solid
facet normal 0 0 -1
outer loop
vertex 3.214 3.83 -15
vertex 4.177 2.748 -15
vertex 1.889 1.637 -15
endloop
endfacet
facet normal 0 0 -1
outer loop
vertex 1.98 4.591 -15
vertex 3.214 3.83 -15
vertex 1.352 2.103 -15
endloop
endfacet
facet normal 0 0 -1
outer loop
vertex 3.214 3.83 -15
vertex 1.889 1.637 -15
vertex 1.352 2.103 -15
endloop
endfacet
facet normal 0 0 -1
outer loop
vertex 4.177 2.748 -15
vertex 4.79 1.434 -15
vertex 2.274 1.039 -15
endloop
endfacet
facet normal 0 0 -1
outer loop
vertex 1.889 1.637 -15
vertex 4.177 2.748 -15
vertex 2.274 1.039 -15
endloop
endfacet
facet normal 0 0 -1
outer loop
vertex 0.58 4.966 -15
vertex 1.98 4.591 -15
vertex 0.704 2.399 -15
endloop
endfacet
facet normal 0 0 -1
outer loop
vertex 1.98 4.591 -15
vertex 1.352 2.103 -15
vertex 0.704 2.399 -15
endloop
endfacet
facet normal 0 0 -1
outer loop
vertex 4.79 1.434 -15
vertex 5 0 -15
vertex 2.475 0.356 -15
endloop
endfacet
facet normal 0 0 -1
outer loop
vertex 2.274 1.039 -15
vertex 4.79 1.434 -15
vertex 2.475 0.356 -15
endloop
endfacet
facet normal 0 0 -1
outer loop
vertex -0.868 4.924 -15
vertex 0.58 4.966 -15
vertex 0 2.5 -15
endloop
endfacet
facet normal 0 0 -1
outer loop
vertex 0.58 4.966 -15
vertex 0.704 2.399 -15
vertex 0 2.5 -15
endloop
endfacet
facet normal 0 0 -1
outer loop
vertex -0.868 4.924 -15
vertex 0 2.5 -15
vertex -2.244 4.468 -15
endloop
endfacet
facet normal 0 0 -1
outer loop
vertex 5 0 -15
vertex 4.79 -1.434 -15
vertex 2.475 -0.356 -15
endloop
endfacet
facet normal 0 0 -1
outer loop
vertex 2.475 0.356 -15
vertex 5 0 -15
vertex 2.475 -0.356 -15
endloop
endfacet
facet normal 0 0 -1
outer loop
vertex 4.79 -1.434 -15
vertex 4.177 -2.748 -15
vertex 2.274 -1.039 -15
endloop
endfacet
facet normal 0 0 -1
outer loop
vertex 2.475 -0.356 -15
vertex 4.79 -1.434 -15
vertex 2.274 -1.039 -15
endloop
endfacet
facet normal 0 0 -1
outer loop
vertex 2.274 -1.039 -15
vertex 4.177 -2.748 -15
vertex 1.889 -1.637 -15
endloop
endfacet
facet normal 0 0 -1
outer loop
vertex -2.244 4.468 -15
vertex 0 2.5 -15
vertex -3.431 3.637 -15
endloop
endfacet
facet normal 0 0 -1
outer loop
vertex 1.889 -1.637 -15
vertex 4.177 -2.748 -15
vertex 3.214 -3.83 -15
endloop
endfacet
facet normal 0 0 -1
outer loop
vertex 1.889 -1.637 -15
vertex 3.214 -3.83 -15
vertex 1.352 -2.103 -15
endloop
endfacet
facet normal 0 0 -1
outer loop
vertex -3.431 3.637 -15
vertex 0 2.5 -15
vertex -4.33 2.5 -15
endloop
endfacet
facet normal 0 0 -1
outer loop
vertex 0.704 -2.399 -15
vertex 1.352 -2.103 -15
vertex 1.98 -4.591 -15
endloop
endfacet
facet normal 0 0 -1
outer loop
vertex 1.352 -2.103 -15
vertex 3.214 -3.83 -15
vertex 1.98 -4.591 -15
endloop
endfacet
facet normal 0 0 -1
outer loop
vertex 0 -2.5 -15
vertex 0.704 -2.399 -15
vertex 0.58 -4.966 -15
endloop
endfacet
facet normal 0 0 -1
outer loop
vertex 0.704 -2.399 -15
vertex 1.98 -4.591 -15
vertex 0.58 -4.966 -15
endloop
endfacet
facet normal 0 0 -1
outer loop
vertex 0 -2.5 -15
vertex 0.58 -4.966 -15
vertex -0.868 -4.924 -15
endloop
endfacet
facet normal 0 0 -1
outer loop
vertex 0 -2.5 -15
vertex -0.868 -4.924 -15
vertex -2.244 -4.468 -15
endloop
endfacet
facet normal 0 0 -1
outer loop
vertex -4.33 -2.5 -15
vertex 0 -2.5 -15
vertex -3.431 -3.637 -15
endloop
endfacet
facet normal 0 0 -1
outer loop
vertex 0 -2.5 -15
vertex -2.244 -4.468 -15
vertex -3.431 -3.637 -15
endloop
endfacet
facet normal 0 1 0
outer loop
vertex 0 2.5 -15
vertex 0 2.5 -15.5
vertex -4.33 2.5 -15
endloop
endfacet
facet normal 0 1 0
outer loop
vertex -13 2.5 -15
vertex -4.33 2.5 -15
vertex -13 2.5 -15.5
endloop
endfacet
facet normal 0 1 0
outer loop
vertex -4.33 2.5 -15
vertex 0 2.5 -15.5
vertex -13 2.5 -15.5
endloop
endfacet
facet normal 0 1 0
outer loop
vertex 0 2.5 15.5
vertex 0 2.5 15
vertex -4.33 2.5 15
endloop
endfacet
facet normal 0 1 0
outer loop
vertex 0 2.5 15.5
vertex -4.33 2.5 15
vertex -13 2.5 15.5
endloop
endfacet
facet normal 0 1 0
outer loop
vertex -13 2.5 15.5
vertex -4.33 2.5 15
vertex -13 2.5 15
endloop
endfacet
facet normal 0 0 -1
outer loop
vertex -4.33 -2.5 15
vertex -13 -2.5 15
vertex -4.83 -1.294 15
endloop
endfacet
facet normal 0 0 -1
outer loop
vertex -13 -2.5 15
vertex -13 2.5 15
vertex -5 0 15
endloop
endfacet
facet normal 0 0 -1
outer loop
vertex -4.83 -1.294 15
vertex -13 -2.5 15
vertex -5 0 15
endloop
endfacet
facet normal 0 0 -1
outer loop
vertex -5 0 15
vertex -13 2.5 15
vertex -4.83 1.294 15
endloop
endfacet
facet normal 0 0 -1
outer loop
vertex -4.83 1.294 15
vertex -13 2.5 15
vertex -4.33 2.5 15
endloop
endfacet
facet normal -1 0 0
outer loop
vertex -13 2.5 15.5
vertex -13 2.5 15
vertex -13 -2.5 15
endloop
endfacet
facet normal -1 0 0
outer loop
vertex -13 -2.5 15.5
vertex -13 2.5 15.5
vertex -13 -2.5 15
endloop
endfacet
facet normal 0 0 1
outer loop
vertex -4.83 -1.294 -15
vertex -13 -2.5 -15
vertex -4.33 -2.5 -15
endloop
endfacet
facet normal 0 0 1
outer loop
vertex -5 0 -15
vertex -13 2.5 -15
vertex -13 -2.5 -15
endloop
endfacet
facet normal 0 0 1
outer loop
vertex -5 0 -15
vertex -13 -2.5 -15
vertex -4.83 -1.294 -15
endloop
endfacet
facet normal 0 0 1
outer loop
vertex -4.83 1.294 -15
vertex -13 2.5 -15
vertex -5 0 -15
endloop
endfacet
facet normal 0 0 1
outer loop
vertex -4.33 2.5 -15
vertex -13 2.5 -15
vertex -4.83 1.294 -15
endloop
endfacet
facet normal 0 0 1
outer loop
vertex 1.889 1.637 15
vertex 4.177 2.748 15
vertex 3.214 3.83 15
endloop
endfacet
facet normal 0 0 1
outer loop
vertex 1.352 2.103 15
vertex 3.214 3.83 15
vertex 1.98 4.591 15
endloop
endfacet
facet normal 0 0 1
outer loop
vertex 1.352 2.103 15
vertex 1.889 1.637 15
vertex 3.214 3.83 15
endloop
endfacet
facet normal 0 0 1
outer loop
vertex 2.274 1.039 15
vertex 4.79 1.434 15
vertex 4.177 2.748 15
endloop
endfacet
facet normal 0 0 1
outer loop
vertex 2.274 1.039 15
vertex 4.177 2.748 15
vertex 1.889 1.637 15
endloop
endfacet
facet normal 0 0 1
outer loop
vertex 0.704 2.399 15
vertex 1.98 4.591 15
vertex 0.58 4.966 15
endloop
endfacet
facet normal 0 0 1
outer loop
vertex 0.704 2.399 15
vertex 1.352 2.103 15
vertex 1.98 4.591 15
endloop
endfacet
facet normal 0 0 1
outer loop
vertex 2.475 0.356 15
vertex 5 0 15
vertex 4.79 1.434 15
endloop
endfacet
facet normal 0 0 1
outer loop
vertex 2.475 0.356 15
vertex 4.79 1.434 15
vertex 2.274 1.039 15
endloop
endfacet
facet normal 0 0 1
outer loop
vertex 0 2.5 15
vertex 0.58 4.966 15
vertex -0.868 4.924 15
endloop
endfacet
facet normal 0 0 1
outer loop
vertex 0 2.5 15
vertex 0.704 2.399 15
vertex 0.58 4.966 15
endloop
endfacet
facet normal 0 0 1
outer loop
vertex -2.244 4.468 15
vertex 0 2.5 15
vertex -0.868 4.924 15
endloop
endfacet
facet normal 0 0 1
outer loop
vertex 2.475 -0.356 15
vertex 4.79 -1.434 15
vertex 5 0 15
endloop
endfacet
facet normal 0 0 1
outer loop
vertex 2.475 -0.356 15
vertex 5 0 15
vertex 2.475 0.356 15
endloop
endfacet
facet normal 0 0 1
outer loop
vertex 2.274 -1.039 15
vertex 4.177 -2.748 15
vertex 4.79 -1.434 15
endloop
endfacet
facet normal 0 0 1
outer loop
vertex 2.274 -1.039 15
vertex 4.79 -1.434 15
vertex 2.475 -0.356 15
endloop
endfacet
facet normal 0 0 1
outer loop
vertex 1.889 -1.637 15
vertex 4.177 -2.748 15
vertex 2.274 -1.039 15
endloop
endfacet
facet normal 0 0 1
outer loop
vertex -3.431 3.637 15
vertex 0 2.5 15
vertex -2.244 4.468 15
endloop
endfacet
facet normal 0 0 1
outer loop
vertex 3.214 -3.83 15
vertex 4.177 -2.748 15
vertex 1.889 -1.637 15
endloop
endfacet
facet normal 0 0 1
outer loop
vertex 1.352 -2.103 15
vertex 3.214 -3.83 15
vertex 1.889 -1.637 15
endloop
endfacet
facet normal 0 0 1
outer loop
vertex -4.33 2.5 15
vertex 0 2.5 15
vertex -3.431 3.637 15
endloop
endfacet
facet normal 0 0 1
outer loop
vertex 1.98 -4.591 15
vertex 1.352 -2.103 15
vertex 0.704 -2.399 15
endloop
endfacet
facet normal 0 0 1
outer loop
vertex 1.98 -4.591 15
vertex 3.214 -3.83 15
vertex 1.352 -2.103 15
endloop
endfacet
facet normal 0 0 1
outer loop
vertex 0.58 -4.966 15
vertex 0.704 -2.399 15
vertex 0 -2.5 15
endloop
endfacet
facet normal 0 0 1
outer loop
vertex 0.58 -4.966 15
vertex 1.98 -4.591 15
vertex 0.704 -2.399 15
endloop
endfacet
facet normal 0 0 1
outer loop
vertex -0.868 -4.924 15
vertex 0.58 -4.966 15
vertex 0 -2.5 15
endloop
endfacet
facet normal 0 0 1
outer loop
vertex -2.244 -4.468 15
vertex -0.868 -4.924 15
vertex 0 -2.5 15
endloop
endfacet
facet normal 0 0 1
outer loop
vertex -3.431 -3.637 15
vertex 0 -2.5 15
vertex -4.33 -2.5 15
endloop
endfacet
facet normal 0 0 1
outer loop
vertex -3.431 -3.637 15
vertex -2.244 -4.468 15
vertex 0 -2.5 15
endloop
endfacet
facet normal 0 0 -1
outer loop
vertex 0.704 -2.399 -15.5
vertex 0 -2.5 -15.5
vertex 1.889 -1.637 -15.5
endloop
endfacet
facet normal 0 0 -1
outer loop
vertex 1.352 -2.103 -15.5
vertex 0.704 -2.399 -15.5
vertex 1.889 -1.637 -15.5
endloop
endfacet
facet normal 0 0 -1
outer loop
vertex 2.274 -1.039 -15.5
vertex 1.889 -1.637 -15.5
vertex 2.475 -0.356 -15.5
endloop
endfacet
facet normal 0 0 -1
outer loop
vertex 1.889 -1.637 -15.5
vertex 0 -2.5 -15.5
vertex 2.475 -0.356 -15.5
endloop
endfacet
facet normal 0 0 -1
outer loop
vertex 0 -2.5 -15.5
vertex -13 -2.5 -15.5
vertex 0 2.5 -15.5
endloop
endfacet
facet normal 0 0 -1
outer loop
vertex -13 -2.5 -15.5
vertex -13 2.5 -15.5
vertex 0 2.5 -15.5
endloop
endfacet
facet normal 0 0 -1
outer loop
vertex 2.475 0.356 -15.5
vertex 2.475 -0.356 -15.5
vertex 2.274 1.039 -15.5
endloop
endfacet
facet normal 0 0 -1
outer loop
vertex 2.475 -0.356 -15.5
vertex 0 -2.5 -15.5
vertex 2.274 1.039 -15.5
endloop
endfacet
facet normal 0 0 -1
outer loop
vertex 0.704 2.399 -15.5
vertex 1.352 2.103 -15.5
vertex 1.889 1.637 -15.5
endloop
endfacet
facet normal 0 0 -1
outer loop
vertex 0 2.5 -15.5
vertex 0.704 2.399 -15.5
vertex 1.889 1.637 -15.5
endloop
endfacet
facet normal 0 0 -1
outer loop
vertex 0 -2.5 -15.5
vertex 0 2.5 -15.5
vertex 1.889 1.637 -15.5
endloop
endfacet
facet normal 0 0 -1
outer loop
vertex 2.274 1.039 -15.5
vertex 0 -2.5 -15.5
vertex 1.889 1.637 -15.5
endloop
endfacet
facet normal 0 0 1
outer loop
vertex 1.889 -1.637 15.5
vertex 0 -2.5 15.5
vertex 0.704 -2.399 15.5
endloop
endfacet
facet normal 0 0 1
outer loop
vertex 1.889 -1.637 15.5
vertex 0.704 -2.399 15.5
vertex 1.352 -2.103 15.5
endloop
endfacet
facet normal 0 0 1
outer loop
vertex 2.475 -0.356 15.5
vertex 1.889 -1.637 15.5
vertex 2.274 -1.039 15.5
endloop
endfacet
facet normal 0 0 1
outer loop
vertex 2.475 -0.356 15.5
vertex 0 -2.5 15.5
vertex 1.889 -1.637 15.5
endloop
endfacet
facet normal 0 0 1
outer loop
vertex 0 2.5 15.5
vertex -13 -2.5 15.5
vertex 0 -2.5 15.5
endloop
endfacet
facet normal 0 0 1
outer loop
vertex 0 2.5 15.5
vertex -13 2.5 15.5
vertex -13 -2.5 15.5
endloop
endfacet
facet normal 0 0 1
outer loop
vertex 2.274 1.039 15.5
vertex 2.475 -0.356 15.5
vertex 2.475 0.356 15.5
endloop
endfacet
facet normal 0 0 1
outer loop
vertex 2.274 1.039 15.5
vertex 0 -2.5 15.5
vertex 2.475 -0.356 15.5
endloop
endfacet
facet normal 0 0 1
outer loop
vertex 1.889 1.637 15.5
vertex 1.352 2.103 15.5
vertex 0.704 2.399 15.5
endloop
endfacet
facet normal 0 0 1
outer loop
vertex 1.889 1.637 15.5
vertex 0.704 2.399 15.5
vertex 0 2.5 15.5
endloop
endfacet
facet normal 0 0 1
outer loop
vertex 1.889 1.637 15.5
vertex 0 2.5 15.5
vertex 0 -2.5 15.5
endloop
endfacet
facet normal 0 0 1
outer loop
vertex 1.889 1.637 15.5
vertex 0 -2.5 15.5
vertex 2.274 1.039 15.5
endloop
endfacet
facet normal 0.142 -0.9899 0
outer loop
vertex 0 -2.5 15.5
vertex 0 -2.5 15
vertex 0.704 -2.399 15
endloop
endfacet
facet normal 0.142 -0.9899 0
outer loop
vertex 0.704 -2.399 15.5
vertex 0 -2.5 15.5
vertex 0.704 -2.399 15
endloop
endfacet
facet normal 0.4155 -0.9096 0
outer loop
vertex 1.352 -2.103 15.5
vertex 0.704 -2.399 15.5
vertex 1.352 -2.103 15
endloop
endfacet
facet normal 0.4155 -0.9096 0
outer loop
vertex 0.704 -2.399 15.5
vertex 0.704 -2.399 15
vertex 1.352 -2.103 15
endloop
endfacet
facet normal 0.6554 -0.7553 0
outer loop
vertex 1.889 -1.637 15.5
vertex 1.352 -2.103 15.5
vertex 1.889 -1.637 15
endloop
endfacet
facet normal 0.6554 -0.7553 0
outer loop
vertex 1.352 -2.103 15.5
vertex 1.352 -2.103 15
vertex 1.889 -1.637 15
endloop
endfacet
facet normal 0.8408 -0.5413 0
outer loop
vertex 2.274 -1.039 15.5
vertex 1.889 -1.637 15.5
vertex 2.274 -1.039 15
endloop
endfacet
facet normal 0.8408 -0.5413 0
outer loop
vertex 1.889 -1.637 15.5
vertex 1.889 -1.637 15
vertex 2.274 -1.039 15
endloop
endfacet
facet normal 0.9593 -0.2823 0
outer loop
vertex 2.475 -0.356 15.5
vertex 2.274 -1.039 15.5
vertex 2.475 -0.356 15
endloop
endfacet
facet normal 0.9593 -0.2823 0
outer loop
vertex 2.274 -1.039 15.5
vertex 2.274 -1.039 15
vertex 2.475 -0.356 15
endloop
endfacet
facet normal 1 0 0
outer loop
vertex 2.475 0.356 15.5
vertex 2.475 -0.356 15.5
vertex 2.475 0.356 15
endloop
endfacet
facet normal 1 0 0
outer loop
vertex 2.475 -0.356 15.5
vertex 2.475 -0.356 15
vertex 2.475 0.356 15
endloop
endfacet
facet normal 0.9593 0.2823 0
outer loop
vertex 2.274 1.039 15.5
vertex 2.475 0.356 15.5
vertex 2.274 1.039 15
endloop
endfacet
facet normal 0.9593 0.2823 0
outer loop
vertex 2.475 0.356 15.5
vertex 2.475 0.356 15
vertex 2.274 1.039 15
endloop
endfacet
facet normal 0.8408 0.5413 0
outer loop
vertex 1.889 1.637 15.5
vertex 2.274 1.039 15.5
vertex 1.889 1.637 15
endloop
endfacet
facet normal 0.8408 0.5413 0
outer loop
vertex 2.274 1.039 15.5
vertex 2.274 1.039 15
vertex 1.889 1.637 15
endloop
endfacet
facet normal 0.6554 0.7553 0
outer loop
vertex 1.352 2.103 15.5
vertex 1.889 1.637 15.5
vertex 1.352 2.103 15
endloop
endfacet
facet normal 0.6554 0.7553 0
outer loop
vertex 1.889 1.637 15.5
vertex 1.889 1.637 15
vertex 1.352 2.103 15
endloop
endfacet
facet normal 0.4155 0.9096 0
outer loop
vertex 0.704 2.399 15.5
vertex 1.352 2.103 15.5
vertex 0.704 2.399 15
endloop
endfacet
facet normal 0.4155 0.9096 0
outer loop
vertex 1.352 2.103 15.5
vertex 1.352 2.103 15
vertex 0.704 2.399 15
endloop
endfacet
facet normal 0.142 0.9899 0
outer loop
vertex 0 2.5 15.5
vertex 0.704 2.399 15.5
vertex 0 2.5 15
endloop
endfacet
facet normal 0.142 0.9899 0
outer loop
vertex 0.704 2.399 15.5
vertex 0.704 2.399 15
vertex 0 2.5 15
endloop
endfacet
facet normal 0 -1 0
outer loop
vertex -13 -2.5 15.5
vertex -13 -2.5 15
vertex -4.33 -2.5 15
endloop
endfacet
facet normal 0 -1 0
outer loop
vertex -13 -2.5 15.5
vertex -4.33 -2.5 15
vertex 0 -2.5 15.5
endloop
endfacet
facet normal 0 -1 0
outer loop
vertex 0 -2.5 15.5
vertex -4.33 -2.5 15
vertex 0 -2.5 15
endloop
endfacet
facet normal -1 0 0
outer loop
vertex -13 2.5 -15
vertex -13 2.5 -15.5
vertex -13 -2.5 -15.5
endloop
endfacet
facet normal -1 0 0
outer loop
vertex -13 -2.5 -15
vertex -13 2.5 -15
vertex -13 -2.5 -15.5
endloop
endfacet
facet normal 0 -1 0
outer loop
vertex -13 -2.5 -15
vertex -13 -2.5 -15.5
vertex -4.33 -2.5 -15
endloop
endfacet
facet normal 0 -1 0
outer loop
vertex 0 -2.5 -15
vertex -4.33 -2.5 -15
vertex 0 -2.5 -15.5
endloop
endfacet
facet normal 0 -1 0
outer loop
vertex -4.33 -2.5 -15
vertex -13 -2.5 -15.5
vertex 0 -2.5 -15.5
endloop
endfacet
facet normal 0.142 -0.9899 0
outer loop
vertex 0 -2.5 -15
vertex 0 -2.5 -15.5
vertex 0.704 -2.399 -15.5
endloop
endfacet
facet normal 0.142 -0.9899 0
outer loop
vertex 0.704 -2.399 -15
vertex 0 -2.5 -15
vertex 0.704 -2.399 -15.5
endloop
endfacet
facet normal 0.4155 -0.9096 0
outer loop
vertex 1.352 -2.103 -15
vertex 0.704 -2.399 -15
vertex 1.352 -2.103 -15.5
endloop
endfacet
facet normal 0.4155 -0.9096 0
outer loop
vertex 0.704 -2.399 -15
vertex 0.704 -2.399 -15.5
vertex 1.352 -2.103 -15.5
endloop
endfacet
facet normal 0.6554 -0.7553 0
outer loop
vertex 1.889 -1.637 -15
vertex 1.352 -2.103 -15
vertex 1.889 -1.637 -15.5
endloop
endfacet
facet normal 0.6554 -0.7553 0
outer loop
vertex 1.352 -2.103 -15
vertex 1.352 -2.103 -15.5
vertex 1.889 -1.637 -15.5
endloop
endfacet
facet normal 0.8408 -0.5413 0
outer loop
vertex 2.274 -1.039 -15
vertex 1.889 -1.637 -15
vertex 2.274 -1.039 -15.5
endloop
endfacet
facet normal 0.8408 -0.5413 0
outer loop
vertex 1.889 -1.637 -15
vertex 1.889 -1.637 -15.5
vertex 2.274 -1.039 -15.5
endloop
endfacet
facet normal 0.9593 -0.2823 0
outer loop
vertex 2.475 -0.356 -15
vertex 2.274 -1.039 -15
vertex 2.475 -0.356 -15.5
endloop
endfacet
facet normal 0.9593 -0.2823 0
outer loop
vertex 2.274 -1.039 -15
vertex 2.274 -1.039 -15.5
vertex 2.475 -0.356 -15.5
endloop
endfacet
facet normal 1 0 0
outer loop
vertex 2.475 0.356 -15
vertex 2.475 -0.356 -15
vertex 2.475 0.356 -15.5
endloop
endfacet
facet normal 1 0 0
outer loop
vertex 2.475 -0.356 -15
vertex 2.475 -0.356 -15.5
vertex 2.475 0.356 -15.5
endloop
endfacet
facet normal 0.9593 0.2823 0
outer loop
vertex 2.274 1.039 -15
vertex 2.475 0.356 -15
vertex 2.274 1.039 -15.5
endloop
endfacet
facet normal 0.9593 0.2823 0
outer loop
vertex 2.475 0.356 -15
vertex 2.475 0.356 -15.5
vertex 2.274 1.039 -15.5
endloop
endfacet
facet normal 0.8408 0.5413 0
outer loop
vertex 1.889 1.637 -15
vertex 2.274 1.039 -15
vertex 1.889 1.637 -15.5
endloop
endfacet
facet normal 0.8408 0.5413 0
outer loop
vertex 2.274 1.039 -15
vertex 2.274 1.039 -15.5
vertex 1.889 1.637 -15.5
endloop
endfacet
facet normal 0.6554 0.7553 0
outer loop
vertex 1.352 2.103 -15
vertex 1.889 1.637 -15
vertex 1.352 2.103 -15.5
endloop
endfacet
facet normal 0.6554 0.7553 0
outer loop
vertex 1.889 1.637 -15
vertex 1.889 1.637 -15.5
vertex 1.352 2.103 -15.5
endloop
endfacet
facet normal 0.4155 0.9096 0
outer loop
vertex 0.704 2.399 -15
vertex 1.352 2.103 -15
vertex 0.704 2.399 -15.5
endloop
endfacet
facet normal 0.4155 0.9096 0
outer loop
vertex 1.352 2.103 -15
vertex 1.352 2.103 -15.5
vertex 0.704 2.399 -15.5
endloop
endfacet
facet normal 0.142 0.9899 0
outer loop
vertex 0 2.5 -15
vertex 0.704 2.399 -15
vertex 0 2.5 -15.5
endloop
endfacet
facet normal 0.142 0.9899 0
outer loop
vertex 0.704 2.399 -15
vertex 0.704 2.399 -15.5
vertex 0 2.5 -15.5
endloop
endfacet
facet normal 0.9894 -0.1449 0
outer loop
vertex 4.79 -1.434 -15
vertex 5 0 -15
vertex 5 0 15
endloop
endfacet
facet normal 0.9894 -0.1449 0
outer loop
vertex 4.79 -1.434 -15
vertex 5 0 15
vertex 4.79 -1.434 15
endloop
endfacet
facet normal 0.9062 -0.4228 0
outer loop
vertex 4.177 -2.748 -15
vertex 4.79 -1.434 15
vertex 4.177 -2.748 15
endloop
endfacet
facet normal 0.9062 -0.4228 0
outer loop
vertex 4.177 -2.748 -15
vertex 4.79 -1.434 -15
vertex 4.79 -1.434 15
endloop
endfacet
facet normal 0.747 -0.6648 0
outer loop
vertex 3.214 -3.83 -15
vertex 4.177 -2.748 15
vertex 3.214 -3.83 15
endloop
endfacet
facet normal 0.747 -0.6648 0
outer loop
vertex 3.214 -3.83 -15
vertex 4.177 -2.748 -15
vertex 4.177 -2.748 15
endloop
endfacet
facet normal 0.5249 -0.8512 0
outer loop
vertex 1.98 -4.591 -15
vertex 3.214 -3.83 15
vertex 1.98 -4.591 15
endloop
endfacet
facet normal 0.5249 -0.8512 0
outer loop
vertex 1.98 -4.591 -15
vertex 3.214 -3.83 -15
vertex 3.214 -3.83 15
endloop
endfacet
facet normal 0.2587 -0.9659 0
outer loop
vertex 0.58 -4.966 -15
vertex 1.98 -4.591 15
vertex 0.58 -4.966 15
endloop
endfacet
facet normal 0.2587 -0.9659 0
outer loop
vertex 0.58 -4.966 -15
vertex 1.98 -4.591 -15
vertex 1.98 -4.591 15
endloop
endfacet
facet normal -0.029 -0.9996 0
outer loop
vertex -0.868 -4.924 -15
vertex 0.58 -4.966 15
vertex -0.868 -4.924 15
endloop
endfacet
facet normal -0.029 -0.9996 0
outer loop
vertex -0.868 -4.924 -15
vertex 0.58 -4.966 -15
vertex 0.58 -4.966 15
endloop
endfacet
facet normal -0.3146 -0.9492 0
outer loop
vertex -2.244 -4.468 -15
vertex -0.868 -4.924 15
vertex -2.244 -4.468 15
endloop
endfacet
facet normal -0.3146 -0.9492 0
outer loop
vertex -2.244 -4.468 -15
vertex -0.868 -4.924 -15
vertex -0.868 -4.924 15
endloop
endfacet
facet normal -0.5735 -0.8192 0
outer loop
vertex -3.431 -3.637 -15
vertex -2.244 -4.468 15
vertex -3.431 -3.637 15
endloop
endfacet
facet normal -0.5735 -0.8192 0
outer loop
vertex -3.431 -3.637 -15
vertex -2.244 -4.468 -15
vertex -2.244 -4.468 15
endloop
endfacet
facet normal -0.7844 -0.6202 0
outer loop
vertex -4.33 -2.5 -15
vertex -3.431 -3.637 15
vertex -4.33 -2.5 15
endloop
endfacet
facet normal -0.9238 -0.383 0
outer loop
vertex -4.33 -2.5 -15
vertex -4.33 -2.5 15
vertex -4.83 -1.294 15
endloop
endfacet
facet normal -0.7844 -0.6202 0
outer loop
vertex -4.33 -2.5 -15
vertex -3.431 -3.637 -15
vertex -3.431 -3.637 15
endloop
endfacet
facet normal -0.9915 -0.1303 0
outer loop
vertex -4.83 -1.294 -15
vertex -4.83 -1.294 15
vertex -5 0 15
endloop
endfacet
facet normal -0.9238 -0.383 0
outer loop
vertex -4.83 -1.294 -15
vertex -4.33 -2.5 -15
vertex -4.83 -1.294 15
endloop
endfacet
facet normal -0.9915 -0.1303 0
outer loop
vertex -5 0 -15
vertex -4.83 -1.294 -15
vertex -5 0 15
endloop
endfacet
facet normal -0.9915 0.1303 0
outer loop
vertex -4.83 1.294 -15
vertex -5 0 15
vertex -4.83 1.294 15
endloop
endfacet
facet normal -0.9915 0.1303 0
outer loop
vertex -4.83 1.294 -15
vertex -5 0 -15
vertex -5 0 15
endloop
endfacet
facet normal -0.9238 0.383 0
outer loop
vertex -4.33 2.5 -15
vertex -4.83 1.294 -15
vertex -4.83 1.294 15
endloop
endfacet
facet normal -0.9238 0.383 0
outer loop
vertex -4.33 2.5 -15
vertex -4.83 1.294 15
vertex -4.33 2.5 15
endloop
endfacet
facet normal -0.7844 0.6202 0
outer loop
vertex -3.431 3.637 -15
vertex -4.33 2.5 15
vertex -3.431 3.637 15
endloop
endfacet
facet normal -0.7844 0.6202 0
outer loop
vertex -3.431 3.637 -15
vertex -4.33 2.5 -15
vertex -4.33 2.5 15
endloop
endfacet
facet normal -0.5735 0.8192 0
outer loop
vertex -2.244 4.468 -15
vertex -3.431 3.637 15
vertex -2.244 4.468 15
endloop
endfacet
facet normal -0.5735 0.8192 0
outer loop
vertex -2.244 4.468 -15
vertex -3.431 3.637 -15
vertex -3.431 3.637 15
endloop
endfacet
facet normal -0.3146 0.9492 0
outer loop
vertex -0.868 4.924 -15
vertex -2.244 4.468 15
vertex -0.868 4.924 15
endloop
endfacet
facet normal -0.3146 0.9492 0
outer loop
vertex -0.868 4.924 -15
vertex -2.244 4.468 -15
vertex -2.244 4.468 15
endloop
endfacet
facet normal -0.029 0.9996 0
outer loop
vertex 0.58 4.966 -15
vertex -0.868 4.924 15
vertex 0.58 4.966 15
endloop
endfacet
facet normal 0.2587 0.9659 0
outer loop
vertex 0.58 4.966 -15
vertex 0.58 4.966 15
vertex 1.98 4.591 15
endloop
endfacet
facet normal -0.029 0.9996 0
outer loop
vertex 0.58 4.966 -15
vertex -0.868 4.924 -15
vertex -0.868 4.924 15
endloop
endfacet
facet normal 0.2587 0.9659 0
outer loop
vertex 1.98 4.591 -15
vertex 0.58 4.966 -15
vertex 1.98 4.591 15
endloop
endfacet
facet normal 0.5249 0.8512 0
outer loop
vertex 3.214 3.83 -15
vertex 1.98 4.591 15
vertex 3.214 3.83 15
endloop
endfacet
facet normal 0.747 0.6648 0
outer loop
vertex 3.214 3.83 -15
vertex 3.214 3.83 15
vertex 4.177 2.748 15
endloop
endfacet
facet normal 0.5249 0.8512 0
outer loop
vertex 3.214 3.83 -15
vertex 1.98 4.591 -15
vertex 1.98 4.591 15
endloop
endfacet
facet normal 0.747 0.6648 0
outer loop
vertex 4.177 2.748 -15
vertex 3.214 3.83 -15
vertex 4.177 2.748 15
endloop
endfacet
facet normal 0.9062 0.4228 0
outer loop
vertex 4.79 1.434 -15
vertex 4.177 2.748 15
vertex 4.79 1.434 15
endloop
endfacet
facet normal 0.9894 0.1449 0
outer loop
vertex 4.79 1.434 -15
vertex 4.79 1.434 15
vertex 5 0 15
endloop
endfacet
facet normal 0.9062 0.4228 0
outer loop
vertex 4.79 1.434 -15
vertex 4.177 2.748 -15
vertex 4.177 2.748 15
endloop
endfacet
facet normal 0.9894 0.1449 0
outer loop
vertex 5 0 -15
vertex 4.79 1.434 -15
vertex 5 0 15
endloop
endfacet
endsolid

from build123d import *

# Parameters (mm, degrees)
SKETCH1_W           = 30
SKETCH1_H           = 5
BOSS_EXTRUDE1_START = 15
BOSS_EXTRUDE1_DEPTH = 0.5
BOSS_EXTRUDE2_START = -15.5
BOSS_EXTRUDE2_DEPTH = 0.5


with BuildPart() as part:
    # Sketch1 → Revolve1 (revolve)
    with BuildSketch(Plane(origin=(0, 0, 0), x_dir=(0, 0, -1), z_dir=(1, 0, 0)), mode=Mode.PRIVATE) as revolve1_sk:
        with Locations((0, 2.5)):
            Rectangle(SKETCH1_W, SKETCH1_H)
    revolve(revolve1_sk.sketch.rotate(Axis((0, 0, 15), (0, 0, -1)), 90), axis=Axis((0, 0, 15), (0, 0, -1)))

    # Sketch2 → Boss-Extrude1 (add)
    with BuildSketch(Plane.XY.offset(BOSS_EXTRUDE1_START)):
        with BuildLine():
            Line((-13, -2.5), (0, -2.5))
            ThreePointArc((0, -2.5), (2.5, 0), (0, 2.5))
            Line((0, 2.5), (-13, 2.5))
            Line((-13, 2.5), (-13, -2.5))
        make_face()
    extrude(amount=BOSS_EXTRUDE1_DEPTH)

    # Sketch2<2> → Boss-Extrude2 (add)
    with BuildSketch(Plane.XY.offset(BOSS_EXTRUDE2_START)):
        with BuildLine():
            Line((-13, -2.5), (0, -2.5))
            ThreePointArc((0, -2.5), (2.5, 0), (0, 2.5))
            Line((0, 2.5), (-13, 2.5))
            Line((-13, 2.5), (-13, -2.5))
        make_face()
    extrude(amount=BOSS_EXTRUDE2_DEPTH)


solid = part.part
